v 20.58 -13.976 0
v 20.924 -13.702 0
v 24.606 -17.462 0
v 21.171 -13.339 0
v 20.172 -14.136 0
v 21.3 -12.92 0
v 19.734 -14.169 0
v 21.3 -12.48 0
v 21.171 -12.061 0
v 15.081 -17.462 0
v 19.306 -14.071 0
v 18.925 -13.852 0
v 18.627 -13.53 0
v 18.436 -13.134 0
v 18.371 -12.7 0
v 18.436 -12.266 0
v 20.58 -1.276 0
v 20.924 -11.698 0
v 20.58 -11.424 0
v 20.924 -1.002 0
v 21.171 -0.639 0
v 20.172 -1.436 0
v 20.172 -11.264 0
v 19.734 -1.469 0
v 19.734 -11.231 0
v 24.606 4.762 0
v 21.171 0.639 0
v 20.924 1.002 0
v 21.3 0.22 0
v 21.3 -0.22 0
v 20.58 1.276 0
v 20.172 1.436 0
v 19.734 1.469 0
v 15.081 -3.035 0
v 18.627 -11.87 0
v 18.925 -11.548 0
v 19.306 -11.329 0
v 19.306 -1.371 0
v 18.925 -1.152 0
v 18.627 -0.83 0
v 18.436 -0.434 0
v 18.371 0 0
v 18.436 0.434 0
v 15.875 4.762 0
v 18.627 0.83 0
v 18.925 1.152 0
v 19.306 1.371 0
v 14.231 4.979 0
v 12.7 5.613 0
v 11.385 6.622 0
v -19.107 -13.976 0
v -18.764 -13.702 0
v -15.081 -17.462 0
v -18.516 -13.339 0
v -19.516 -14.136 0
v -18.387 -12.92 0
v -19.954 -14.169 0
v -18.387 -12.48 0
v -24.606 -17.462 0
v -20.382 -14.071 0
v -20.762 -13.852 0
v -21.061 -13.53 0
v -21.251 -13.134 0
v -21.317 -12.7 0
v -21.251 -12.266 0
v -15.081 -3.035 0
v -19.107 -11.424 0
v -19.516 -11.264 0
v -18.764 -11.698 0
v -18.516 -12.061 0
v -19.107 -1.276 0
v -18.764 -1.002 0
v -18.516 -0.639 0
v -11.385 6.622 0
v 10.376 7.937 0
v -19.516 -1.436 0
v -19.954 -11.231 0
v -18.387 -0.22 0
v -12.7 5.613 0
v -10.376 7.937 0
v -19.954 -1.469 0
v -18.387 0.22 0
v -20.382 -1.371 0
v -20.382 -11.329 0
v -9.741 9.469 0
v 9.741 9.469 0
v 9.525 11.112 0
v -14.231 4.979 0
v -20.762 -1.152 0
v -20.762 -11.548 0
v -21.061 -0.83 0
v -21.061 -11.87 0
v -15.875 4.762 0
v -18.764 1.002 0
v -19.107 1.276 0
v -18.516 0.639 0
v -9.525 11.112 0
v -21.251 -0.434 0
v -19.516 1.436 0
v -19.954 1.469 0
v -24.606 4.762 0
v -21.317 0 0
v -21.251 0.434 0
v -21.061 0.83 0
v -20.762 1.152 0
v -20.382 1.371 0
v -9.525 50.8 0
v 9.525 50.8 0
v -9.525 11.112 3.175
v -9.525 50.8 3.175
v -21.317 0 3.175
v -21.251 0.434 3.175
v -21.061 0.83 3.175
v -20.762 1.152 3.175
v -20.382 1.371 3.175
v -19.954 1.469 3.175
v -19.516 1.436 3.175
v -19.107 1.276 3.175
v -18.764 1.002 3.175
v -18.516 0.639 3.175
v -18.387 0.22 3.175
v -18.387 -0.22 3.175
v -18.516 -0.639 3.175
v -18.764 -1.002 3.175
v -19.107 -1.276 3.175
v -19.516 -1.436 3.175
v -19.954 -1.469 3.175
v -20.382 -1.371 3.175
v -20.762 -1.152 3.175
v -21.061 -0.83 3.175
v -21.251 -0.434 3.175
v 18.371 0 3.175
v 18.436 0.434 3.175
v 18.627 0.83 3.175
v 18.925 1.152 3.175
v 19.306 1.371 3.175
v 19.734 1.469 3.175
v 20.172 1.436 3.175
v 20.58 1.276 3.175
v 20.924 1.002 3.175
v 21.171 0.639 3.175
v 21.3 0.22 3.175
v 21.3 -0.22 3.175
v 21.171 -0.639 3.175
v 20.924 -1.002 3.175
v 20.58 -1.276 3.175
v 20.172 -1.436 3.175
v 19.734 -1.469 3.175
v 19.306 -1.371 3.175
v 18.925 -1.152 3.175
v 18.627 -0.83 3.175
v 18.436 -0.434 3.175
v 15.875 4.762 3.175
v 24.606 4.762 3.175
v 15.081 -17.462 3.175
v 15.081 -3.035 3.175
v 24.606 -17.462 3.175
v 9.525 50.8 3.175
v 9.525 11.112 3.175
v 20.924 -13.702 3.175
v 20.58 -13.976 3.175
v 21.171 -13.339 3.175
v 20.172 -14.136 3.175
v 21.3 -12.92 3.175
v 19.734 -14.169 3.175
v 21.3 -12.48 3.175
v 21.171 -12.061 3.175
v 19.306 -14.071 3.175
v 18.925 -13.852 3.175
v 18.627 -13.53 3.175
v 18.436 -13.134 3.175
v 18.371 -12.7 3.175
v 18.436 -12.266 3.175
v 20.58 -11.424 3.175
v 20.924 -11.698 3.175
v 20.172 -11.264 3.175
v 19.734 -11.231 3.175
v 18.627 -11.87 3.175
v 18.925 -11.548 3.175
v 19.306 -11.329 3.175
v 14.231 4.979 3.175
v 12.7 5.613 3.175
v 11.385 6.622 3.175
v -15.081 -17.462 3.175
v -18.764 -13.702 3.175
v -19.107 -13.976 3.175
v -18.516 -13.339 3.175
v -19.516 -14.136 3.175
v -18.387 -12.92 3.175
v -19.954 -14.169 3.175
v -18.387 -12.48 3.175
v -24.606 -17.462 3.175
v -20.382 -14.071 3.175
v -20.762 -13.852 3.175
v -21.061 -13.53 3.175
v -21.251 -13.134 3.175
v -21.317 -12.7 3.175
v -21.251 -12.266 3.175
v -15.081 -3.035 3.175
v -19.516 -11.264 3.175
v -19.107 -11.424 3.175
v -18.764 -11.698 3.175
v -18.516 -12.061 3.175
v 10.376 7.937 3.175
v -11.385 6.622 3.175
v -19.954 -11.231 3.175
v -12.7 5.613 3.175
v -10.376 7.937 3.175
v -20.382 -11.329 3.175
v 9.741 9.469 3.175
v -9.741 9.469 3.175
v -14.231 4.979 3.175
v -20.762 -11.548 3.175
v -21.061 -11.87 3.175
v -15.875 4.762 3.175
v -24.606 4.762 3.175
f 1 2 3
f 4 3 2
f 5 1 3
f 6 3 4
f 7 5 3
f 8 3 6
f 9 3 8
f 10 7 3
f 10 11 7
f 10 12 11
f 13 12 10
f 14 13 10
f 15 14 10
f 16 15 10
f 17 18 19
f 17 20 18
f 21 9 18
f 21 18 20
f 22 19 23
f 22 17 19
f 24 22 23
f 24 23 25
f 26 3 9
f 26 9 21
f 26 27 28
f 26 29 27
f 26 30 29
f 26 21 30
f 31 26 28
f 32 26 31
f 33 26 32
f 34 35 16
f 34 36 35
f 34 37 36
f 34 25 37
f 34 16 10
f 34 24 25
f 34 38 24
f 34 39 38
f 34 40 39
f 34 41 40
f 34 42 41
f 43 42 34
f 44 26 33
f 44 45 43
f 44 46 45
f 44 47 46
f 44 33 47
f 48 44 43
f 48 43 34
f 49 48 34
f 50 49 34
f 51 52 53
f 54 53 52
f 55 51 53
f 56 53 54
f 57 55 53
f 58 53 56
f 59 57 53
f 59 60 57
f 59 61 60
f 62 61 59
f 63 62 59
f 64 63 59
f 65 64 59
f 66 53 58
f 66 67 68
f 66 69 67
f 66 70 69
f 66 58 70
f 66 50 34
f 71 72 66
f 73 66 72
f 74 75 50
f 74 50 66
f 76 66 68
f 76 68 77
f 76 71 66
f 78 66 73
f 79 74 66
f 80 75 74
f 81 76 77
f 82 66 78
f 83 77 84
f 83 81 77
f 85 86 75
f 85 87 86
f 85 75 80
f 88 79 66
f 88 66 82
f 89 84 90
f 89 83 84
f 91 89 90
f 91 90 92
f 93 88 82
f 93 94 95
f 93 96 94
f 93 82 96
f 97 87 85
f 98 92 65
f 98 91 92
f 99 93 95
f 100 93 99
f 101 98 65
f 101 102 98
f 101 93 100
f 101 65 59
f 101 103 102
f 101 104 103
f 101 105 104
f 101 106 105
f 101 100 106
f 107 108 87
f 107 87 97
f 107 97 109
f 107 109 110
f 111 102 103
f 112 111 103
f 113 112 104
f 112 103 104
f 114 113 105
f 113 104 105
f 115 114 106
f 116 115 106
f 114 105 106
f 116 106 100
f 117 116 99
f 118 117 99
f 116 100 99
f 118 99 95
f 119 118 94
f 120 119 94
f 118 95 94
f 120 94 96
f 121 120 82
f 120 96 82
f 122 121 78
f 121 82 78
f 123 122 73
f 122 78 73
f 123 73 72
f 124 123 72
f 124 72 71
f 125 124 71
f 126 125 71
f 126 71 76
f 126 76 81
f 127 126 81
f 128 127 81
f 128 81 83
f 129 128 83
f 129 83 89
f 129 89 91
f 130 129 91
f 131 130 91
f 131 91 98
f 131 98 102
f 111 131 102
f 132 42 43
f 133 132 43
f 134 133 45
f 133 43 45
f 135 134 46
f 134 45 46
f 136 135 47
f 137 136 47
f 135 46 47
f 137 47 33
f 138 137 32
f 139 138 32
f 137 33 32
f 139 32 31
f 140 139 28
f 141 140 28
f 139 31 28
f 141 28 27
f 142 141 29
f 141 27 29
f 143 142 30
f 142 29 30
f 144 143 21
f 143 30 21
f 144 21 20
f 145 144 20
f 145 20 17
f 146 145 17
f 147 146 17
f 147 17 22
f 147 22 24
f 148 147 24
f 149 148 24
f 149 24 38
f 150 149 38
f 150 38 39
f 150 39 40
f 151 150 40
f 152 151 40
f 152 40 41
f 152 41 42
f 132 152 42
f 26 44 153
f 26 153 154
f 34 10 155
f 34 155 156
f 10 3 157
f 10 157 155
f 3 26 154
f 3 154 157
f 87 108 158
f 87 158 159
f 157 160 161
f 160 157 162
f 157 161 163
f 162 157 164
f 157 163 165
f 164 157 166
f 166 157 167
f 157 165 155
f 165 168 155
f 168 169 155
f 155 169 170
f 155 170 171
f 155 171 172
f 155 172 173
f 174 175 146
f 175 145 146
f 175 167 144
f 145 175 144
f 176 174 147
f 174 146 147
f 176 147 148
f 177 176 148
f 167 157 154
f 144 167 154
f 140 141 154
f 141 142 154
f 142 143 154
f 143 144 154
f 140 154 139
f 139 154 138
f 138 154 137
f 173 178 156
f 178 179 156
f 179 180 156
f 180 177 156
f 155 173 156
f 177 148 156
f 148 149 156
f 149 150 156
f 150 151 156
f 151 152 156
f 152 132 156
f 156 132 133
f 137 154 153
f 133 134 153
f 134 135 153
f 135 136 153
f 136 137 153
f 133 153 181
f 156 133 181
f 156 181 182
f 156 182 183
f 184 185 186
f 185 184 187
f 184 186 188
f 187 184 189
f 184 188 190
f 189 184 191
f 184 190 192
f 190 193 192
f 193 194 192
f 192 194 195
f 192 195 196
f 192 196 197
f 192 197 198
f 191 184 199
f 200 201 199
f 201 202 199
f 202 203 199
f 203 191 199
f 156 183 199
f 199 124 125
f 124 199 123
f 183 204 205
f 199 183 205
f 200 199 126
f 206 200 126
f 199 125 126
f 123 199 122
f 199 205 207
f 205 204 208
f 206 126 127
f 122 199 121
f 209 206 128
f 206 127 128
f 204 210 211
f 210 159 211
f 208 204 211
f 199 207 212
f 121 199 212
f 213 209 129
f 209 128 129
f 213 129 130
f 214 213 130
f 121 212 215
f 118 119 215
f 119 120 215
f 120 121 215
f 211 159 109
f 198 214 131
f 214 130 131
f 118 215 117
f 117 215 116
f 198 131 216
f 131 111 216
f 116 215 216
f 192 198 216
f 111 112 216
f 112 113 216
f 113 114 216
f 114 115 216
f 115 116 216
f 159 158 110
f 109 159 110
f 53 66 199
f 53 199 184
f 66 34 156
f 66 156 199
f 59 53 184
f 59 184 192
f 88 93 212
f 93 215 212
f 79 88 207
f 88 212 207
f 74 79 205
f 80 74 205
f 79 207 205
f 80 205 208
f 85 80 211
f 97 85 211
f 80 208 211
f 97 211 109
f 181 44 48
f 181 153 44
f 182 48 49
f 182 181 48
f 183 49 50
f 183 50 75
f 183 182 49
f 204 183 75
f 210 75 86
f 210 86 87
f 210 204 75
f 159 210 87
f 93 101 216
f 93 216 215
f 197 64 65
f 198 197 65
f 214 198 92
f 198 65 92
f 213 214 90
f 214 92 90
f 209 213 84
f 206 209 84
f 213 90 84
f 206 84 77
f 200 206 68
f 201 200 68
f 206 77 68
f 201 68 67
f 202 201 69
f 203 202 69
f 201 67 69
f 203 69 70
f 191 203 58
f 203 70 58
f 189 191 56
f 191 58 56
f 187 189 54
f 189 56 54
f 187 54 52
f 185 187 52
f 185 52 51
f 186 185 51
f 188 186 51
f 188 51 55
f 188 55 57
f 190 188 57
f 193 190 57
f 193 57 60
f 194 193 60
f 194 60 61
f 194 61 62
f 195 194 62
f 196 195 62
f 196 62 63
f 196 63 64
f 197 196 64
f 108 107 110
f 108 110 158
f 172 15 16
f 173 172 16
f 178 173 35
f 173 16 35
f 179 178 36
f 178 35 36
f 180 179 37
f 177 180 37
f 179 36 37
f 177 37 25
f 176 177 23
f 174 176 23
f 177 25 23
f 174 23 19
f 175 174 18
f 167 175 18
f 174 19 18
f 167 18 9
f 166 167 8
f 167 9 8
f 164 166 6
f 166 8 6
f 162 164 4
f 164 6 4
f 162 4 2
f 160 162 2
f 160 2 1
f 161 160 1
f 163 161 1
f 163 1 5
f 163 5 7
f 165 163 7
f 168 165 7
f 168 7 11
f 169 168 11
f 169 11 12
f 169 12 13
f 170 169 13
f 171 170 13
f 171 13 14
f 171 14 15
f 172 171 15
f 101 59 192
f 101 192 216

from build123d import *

# Parameters (mm, degrees)
BOSS_EXTRUDE1_DEPTH       = 3.175
F_4_CLEARANCE_HOLE1_D     = 2.9464
F_4_CLEARANCE_HOLE1_DEPTH = 3.302
F_4_CLEARANCE_HOLE1_TIP   = 0.885187864
FILLET1_R                 = 6.35


with BuildPart() as part:
    # Sketch1 → Boss-Extrude1 (new body)
    with BuildSketch(Plane.XY):
        Polygon((-15.08125, -3.0353), (-15.08125, -17.4625), (-24.60625, -17.4625), (-24.60625, 4.7625), (-9.525, 4.7625), (-9.525, 50.8), (9.525, 50.8), (9.525, 4.7625), (24.60625, 4.7625), (24.60625, -17.4625), (15.08125, -17.4625), (15.08125, -3.0353), align=None)
    extrude(amount=BOSS_EXTRUDE1_DEPTH)

    # #4 Clearance Hole1
    with Locations(Plane.XY.offset(3.175)):
        with Locations((-19.84375, 0), (19.84375, 0), (19.84375, -12.7), (-19.84375, -12.7)):
            Hole(F_4_CLEARANCE_HOLE1_D / 2, depth=F_4_CLEARANCE_HOLE1_DEPTH)
            with Locations((0, 0, -(F_4_CLEARANCE_HOLE1_DEPTH + F_4_CLEARANCE_HOLE1_TIP / 2))):  # 118° drill point
                Cone(0, F_4_CLEARANCE_HOLE1_D / 2, F_4_CLEARANCE_HOLE1_TIP, mode=Mode.SUBTRACT)

    # Fillet1
    fillet1_edges = [part.edges().sort_by_distance(p)[0] for p in [
        (-9.525, 4.7625, 1.5875),
        (9.525, 4.7625, 1.5875),
    ]]
    fillet(fillet1_edges, radius=FILLET1_R)


solid = part.part
